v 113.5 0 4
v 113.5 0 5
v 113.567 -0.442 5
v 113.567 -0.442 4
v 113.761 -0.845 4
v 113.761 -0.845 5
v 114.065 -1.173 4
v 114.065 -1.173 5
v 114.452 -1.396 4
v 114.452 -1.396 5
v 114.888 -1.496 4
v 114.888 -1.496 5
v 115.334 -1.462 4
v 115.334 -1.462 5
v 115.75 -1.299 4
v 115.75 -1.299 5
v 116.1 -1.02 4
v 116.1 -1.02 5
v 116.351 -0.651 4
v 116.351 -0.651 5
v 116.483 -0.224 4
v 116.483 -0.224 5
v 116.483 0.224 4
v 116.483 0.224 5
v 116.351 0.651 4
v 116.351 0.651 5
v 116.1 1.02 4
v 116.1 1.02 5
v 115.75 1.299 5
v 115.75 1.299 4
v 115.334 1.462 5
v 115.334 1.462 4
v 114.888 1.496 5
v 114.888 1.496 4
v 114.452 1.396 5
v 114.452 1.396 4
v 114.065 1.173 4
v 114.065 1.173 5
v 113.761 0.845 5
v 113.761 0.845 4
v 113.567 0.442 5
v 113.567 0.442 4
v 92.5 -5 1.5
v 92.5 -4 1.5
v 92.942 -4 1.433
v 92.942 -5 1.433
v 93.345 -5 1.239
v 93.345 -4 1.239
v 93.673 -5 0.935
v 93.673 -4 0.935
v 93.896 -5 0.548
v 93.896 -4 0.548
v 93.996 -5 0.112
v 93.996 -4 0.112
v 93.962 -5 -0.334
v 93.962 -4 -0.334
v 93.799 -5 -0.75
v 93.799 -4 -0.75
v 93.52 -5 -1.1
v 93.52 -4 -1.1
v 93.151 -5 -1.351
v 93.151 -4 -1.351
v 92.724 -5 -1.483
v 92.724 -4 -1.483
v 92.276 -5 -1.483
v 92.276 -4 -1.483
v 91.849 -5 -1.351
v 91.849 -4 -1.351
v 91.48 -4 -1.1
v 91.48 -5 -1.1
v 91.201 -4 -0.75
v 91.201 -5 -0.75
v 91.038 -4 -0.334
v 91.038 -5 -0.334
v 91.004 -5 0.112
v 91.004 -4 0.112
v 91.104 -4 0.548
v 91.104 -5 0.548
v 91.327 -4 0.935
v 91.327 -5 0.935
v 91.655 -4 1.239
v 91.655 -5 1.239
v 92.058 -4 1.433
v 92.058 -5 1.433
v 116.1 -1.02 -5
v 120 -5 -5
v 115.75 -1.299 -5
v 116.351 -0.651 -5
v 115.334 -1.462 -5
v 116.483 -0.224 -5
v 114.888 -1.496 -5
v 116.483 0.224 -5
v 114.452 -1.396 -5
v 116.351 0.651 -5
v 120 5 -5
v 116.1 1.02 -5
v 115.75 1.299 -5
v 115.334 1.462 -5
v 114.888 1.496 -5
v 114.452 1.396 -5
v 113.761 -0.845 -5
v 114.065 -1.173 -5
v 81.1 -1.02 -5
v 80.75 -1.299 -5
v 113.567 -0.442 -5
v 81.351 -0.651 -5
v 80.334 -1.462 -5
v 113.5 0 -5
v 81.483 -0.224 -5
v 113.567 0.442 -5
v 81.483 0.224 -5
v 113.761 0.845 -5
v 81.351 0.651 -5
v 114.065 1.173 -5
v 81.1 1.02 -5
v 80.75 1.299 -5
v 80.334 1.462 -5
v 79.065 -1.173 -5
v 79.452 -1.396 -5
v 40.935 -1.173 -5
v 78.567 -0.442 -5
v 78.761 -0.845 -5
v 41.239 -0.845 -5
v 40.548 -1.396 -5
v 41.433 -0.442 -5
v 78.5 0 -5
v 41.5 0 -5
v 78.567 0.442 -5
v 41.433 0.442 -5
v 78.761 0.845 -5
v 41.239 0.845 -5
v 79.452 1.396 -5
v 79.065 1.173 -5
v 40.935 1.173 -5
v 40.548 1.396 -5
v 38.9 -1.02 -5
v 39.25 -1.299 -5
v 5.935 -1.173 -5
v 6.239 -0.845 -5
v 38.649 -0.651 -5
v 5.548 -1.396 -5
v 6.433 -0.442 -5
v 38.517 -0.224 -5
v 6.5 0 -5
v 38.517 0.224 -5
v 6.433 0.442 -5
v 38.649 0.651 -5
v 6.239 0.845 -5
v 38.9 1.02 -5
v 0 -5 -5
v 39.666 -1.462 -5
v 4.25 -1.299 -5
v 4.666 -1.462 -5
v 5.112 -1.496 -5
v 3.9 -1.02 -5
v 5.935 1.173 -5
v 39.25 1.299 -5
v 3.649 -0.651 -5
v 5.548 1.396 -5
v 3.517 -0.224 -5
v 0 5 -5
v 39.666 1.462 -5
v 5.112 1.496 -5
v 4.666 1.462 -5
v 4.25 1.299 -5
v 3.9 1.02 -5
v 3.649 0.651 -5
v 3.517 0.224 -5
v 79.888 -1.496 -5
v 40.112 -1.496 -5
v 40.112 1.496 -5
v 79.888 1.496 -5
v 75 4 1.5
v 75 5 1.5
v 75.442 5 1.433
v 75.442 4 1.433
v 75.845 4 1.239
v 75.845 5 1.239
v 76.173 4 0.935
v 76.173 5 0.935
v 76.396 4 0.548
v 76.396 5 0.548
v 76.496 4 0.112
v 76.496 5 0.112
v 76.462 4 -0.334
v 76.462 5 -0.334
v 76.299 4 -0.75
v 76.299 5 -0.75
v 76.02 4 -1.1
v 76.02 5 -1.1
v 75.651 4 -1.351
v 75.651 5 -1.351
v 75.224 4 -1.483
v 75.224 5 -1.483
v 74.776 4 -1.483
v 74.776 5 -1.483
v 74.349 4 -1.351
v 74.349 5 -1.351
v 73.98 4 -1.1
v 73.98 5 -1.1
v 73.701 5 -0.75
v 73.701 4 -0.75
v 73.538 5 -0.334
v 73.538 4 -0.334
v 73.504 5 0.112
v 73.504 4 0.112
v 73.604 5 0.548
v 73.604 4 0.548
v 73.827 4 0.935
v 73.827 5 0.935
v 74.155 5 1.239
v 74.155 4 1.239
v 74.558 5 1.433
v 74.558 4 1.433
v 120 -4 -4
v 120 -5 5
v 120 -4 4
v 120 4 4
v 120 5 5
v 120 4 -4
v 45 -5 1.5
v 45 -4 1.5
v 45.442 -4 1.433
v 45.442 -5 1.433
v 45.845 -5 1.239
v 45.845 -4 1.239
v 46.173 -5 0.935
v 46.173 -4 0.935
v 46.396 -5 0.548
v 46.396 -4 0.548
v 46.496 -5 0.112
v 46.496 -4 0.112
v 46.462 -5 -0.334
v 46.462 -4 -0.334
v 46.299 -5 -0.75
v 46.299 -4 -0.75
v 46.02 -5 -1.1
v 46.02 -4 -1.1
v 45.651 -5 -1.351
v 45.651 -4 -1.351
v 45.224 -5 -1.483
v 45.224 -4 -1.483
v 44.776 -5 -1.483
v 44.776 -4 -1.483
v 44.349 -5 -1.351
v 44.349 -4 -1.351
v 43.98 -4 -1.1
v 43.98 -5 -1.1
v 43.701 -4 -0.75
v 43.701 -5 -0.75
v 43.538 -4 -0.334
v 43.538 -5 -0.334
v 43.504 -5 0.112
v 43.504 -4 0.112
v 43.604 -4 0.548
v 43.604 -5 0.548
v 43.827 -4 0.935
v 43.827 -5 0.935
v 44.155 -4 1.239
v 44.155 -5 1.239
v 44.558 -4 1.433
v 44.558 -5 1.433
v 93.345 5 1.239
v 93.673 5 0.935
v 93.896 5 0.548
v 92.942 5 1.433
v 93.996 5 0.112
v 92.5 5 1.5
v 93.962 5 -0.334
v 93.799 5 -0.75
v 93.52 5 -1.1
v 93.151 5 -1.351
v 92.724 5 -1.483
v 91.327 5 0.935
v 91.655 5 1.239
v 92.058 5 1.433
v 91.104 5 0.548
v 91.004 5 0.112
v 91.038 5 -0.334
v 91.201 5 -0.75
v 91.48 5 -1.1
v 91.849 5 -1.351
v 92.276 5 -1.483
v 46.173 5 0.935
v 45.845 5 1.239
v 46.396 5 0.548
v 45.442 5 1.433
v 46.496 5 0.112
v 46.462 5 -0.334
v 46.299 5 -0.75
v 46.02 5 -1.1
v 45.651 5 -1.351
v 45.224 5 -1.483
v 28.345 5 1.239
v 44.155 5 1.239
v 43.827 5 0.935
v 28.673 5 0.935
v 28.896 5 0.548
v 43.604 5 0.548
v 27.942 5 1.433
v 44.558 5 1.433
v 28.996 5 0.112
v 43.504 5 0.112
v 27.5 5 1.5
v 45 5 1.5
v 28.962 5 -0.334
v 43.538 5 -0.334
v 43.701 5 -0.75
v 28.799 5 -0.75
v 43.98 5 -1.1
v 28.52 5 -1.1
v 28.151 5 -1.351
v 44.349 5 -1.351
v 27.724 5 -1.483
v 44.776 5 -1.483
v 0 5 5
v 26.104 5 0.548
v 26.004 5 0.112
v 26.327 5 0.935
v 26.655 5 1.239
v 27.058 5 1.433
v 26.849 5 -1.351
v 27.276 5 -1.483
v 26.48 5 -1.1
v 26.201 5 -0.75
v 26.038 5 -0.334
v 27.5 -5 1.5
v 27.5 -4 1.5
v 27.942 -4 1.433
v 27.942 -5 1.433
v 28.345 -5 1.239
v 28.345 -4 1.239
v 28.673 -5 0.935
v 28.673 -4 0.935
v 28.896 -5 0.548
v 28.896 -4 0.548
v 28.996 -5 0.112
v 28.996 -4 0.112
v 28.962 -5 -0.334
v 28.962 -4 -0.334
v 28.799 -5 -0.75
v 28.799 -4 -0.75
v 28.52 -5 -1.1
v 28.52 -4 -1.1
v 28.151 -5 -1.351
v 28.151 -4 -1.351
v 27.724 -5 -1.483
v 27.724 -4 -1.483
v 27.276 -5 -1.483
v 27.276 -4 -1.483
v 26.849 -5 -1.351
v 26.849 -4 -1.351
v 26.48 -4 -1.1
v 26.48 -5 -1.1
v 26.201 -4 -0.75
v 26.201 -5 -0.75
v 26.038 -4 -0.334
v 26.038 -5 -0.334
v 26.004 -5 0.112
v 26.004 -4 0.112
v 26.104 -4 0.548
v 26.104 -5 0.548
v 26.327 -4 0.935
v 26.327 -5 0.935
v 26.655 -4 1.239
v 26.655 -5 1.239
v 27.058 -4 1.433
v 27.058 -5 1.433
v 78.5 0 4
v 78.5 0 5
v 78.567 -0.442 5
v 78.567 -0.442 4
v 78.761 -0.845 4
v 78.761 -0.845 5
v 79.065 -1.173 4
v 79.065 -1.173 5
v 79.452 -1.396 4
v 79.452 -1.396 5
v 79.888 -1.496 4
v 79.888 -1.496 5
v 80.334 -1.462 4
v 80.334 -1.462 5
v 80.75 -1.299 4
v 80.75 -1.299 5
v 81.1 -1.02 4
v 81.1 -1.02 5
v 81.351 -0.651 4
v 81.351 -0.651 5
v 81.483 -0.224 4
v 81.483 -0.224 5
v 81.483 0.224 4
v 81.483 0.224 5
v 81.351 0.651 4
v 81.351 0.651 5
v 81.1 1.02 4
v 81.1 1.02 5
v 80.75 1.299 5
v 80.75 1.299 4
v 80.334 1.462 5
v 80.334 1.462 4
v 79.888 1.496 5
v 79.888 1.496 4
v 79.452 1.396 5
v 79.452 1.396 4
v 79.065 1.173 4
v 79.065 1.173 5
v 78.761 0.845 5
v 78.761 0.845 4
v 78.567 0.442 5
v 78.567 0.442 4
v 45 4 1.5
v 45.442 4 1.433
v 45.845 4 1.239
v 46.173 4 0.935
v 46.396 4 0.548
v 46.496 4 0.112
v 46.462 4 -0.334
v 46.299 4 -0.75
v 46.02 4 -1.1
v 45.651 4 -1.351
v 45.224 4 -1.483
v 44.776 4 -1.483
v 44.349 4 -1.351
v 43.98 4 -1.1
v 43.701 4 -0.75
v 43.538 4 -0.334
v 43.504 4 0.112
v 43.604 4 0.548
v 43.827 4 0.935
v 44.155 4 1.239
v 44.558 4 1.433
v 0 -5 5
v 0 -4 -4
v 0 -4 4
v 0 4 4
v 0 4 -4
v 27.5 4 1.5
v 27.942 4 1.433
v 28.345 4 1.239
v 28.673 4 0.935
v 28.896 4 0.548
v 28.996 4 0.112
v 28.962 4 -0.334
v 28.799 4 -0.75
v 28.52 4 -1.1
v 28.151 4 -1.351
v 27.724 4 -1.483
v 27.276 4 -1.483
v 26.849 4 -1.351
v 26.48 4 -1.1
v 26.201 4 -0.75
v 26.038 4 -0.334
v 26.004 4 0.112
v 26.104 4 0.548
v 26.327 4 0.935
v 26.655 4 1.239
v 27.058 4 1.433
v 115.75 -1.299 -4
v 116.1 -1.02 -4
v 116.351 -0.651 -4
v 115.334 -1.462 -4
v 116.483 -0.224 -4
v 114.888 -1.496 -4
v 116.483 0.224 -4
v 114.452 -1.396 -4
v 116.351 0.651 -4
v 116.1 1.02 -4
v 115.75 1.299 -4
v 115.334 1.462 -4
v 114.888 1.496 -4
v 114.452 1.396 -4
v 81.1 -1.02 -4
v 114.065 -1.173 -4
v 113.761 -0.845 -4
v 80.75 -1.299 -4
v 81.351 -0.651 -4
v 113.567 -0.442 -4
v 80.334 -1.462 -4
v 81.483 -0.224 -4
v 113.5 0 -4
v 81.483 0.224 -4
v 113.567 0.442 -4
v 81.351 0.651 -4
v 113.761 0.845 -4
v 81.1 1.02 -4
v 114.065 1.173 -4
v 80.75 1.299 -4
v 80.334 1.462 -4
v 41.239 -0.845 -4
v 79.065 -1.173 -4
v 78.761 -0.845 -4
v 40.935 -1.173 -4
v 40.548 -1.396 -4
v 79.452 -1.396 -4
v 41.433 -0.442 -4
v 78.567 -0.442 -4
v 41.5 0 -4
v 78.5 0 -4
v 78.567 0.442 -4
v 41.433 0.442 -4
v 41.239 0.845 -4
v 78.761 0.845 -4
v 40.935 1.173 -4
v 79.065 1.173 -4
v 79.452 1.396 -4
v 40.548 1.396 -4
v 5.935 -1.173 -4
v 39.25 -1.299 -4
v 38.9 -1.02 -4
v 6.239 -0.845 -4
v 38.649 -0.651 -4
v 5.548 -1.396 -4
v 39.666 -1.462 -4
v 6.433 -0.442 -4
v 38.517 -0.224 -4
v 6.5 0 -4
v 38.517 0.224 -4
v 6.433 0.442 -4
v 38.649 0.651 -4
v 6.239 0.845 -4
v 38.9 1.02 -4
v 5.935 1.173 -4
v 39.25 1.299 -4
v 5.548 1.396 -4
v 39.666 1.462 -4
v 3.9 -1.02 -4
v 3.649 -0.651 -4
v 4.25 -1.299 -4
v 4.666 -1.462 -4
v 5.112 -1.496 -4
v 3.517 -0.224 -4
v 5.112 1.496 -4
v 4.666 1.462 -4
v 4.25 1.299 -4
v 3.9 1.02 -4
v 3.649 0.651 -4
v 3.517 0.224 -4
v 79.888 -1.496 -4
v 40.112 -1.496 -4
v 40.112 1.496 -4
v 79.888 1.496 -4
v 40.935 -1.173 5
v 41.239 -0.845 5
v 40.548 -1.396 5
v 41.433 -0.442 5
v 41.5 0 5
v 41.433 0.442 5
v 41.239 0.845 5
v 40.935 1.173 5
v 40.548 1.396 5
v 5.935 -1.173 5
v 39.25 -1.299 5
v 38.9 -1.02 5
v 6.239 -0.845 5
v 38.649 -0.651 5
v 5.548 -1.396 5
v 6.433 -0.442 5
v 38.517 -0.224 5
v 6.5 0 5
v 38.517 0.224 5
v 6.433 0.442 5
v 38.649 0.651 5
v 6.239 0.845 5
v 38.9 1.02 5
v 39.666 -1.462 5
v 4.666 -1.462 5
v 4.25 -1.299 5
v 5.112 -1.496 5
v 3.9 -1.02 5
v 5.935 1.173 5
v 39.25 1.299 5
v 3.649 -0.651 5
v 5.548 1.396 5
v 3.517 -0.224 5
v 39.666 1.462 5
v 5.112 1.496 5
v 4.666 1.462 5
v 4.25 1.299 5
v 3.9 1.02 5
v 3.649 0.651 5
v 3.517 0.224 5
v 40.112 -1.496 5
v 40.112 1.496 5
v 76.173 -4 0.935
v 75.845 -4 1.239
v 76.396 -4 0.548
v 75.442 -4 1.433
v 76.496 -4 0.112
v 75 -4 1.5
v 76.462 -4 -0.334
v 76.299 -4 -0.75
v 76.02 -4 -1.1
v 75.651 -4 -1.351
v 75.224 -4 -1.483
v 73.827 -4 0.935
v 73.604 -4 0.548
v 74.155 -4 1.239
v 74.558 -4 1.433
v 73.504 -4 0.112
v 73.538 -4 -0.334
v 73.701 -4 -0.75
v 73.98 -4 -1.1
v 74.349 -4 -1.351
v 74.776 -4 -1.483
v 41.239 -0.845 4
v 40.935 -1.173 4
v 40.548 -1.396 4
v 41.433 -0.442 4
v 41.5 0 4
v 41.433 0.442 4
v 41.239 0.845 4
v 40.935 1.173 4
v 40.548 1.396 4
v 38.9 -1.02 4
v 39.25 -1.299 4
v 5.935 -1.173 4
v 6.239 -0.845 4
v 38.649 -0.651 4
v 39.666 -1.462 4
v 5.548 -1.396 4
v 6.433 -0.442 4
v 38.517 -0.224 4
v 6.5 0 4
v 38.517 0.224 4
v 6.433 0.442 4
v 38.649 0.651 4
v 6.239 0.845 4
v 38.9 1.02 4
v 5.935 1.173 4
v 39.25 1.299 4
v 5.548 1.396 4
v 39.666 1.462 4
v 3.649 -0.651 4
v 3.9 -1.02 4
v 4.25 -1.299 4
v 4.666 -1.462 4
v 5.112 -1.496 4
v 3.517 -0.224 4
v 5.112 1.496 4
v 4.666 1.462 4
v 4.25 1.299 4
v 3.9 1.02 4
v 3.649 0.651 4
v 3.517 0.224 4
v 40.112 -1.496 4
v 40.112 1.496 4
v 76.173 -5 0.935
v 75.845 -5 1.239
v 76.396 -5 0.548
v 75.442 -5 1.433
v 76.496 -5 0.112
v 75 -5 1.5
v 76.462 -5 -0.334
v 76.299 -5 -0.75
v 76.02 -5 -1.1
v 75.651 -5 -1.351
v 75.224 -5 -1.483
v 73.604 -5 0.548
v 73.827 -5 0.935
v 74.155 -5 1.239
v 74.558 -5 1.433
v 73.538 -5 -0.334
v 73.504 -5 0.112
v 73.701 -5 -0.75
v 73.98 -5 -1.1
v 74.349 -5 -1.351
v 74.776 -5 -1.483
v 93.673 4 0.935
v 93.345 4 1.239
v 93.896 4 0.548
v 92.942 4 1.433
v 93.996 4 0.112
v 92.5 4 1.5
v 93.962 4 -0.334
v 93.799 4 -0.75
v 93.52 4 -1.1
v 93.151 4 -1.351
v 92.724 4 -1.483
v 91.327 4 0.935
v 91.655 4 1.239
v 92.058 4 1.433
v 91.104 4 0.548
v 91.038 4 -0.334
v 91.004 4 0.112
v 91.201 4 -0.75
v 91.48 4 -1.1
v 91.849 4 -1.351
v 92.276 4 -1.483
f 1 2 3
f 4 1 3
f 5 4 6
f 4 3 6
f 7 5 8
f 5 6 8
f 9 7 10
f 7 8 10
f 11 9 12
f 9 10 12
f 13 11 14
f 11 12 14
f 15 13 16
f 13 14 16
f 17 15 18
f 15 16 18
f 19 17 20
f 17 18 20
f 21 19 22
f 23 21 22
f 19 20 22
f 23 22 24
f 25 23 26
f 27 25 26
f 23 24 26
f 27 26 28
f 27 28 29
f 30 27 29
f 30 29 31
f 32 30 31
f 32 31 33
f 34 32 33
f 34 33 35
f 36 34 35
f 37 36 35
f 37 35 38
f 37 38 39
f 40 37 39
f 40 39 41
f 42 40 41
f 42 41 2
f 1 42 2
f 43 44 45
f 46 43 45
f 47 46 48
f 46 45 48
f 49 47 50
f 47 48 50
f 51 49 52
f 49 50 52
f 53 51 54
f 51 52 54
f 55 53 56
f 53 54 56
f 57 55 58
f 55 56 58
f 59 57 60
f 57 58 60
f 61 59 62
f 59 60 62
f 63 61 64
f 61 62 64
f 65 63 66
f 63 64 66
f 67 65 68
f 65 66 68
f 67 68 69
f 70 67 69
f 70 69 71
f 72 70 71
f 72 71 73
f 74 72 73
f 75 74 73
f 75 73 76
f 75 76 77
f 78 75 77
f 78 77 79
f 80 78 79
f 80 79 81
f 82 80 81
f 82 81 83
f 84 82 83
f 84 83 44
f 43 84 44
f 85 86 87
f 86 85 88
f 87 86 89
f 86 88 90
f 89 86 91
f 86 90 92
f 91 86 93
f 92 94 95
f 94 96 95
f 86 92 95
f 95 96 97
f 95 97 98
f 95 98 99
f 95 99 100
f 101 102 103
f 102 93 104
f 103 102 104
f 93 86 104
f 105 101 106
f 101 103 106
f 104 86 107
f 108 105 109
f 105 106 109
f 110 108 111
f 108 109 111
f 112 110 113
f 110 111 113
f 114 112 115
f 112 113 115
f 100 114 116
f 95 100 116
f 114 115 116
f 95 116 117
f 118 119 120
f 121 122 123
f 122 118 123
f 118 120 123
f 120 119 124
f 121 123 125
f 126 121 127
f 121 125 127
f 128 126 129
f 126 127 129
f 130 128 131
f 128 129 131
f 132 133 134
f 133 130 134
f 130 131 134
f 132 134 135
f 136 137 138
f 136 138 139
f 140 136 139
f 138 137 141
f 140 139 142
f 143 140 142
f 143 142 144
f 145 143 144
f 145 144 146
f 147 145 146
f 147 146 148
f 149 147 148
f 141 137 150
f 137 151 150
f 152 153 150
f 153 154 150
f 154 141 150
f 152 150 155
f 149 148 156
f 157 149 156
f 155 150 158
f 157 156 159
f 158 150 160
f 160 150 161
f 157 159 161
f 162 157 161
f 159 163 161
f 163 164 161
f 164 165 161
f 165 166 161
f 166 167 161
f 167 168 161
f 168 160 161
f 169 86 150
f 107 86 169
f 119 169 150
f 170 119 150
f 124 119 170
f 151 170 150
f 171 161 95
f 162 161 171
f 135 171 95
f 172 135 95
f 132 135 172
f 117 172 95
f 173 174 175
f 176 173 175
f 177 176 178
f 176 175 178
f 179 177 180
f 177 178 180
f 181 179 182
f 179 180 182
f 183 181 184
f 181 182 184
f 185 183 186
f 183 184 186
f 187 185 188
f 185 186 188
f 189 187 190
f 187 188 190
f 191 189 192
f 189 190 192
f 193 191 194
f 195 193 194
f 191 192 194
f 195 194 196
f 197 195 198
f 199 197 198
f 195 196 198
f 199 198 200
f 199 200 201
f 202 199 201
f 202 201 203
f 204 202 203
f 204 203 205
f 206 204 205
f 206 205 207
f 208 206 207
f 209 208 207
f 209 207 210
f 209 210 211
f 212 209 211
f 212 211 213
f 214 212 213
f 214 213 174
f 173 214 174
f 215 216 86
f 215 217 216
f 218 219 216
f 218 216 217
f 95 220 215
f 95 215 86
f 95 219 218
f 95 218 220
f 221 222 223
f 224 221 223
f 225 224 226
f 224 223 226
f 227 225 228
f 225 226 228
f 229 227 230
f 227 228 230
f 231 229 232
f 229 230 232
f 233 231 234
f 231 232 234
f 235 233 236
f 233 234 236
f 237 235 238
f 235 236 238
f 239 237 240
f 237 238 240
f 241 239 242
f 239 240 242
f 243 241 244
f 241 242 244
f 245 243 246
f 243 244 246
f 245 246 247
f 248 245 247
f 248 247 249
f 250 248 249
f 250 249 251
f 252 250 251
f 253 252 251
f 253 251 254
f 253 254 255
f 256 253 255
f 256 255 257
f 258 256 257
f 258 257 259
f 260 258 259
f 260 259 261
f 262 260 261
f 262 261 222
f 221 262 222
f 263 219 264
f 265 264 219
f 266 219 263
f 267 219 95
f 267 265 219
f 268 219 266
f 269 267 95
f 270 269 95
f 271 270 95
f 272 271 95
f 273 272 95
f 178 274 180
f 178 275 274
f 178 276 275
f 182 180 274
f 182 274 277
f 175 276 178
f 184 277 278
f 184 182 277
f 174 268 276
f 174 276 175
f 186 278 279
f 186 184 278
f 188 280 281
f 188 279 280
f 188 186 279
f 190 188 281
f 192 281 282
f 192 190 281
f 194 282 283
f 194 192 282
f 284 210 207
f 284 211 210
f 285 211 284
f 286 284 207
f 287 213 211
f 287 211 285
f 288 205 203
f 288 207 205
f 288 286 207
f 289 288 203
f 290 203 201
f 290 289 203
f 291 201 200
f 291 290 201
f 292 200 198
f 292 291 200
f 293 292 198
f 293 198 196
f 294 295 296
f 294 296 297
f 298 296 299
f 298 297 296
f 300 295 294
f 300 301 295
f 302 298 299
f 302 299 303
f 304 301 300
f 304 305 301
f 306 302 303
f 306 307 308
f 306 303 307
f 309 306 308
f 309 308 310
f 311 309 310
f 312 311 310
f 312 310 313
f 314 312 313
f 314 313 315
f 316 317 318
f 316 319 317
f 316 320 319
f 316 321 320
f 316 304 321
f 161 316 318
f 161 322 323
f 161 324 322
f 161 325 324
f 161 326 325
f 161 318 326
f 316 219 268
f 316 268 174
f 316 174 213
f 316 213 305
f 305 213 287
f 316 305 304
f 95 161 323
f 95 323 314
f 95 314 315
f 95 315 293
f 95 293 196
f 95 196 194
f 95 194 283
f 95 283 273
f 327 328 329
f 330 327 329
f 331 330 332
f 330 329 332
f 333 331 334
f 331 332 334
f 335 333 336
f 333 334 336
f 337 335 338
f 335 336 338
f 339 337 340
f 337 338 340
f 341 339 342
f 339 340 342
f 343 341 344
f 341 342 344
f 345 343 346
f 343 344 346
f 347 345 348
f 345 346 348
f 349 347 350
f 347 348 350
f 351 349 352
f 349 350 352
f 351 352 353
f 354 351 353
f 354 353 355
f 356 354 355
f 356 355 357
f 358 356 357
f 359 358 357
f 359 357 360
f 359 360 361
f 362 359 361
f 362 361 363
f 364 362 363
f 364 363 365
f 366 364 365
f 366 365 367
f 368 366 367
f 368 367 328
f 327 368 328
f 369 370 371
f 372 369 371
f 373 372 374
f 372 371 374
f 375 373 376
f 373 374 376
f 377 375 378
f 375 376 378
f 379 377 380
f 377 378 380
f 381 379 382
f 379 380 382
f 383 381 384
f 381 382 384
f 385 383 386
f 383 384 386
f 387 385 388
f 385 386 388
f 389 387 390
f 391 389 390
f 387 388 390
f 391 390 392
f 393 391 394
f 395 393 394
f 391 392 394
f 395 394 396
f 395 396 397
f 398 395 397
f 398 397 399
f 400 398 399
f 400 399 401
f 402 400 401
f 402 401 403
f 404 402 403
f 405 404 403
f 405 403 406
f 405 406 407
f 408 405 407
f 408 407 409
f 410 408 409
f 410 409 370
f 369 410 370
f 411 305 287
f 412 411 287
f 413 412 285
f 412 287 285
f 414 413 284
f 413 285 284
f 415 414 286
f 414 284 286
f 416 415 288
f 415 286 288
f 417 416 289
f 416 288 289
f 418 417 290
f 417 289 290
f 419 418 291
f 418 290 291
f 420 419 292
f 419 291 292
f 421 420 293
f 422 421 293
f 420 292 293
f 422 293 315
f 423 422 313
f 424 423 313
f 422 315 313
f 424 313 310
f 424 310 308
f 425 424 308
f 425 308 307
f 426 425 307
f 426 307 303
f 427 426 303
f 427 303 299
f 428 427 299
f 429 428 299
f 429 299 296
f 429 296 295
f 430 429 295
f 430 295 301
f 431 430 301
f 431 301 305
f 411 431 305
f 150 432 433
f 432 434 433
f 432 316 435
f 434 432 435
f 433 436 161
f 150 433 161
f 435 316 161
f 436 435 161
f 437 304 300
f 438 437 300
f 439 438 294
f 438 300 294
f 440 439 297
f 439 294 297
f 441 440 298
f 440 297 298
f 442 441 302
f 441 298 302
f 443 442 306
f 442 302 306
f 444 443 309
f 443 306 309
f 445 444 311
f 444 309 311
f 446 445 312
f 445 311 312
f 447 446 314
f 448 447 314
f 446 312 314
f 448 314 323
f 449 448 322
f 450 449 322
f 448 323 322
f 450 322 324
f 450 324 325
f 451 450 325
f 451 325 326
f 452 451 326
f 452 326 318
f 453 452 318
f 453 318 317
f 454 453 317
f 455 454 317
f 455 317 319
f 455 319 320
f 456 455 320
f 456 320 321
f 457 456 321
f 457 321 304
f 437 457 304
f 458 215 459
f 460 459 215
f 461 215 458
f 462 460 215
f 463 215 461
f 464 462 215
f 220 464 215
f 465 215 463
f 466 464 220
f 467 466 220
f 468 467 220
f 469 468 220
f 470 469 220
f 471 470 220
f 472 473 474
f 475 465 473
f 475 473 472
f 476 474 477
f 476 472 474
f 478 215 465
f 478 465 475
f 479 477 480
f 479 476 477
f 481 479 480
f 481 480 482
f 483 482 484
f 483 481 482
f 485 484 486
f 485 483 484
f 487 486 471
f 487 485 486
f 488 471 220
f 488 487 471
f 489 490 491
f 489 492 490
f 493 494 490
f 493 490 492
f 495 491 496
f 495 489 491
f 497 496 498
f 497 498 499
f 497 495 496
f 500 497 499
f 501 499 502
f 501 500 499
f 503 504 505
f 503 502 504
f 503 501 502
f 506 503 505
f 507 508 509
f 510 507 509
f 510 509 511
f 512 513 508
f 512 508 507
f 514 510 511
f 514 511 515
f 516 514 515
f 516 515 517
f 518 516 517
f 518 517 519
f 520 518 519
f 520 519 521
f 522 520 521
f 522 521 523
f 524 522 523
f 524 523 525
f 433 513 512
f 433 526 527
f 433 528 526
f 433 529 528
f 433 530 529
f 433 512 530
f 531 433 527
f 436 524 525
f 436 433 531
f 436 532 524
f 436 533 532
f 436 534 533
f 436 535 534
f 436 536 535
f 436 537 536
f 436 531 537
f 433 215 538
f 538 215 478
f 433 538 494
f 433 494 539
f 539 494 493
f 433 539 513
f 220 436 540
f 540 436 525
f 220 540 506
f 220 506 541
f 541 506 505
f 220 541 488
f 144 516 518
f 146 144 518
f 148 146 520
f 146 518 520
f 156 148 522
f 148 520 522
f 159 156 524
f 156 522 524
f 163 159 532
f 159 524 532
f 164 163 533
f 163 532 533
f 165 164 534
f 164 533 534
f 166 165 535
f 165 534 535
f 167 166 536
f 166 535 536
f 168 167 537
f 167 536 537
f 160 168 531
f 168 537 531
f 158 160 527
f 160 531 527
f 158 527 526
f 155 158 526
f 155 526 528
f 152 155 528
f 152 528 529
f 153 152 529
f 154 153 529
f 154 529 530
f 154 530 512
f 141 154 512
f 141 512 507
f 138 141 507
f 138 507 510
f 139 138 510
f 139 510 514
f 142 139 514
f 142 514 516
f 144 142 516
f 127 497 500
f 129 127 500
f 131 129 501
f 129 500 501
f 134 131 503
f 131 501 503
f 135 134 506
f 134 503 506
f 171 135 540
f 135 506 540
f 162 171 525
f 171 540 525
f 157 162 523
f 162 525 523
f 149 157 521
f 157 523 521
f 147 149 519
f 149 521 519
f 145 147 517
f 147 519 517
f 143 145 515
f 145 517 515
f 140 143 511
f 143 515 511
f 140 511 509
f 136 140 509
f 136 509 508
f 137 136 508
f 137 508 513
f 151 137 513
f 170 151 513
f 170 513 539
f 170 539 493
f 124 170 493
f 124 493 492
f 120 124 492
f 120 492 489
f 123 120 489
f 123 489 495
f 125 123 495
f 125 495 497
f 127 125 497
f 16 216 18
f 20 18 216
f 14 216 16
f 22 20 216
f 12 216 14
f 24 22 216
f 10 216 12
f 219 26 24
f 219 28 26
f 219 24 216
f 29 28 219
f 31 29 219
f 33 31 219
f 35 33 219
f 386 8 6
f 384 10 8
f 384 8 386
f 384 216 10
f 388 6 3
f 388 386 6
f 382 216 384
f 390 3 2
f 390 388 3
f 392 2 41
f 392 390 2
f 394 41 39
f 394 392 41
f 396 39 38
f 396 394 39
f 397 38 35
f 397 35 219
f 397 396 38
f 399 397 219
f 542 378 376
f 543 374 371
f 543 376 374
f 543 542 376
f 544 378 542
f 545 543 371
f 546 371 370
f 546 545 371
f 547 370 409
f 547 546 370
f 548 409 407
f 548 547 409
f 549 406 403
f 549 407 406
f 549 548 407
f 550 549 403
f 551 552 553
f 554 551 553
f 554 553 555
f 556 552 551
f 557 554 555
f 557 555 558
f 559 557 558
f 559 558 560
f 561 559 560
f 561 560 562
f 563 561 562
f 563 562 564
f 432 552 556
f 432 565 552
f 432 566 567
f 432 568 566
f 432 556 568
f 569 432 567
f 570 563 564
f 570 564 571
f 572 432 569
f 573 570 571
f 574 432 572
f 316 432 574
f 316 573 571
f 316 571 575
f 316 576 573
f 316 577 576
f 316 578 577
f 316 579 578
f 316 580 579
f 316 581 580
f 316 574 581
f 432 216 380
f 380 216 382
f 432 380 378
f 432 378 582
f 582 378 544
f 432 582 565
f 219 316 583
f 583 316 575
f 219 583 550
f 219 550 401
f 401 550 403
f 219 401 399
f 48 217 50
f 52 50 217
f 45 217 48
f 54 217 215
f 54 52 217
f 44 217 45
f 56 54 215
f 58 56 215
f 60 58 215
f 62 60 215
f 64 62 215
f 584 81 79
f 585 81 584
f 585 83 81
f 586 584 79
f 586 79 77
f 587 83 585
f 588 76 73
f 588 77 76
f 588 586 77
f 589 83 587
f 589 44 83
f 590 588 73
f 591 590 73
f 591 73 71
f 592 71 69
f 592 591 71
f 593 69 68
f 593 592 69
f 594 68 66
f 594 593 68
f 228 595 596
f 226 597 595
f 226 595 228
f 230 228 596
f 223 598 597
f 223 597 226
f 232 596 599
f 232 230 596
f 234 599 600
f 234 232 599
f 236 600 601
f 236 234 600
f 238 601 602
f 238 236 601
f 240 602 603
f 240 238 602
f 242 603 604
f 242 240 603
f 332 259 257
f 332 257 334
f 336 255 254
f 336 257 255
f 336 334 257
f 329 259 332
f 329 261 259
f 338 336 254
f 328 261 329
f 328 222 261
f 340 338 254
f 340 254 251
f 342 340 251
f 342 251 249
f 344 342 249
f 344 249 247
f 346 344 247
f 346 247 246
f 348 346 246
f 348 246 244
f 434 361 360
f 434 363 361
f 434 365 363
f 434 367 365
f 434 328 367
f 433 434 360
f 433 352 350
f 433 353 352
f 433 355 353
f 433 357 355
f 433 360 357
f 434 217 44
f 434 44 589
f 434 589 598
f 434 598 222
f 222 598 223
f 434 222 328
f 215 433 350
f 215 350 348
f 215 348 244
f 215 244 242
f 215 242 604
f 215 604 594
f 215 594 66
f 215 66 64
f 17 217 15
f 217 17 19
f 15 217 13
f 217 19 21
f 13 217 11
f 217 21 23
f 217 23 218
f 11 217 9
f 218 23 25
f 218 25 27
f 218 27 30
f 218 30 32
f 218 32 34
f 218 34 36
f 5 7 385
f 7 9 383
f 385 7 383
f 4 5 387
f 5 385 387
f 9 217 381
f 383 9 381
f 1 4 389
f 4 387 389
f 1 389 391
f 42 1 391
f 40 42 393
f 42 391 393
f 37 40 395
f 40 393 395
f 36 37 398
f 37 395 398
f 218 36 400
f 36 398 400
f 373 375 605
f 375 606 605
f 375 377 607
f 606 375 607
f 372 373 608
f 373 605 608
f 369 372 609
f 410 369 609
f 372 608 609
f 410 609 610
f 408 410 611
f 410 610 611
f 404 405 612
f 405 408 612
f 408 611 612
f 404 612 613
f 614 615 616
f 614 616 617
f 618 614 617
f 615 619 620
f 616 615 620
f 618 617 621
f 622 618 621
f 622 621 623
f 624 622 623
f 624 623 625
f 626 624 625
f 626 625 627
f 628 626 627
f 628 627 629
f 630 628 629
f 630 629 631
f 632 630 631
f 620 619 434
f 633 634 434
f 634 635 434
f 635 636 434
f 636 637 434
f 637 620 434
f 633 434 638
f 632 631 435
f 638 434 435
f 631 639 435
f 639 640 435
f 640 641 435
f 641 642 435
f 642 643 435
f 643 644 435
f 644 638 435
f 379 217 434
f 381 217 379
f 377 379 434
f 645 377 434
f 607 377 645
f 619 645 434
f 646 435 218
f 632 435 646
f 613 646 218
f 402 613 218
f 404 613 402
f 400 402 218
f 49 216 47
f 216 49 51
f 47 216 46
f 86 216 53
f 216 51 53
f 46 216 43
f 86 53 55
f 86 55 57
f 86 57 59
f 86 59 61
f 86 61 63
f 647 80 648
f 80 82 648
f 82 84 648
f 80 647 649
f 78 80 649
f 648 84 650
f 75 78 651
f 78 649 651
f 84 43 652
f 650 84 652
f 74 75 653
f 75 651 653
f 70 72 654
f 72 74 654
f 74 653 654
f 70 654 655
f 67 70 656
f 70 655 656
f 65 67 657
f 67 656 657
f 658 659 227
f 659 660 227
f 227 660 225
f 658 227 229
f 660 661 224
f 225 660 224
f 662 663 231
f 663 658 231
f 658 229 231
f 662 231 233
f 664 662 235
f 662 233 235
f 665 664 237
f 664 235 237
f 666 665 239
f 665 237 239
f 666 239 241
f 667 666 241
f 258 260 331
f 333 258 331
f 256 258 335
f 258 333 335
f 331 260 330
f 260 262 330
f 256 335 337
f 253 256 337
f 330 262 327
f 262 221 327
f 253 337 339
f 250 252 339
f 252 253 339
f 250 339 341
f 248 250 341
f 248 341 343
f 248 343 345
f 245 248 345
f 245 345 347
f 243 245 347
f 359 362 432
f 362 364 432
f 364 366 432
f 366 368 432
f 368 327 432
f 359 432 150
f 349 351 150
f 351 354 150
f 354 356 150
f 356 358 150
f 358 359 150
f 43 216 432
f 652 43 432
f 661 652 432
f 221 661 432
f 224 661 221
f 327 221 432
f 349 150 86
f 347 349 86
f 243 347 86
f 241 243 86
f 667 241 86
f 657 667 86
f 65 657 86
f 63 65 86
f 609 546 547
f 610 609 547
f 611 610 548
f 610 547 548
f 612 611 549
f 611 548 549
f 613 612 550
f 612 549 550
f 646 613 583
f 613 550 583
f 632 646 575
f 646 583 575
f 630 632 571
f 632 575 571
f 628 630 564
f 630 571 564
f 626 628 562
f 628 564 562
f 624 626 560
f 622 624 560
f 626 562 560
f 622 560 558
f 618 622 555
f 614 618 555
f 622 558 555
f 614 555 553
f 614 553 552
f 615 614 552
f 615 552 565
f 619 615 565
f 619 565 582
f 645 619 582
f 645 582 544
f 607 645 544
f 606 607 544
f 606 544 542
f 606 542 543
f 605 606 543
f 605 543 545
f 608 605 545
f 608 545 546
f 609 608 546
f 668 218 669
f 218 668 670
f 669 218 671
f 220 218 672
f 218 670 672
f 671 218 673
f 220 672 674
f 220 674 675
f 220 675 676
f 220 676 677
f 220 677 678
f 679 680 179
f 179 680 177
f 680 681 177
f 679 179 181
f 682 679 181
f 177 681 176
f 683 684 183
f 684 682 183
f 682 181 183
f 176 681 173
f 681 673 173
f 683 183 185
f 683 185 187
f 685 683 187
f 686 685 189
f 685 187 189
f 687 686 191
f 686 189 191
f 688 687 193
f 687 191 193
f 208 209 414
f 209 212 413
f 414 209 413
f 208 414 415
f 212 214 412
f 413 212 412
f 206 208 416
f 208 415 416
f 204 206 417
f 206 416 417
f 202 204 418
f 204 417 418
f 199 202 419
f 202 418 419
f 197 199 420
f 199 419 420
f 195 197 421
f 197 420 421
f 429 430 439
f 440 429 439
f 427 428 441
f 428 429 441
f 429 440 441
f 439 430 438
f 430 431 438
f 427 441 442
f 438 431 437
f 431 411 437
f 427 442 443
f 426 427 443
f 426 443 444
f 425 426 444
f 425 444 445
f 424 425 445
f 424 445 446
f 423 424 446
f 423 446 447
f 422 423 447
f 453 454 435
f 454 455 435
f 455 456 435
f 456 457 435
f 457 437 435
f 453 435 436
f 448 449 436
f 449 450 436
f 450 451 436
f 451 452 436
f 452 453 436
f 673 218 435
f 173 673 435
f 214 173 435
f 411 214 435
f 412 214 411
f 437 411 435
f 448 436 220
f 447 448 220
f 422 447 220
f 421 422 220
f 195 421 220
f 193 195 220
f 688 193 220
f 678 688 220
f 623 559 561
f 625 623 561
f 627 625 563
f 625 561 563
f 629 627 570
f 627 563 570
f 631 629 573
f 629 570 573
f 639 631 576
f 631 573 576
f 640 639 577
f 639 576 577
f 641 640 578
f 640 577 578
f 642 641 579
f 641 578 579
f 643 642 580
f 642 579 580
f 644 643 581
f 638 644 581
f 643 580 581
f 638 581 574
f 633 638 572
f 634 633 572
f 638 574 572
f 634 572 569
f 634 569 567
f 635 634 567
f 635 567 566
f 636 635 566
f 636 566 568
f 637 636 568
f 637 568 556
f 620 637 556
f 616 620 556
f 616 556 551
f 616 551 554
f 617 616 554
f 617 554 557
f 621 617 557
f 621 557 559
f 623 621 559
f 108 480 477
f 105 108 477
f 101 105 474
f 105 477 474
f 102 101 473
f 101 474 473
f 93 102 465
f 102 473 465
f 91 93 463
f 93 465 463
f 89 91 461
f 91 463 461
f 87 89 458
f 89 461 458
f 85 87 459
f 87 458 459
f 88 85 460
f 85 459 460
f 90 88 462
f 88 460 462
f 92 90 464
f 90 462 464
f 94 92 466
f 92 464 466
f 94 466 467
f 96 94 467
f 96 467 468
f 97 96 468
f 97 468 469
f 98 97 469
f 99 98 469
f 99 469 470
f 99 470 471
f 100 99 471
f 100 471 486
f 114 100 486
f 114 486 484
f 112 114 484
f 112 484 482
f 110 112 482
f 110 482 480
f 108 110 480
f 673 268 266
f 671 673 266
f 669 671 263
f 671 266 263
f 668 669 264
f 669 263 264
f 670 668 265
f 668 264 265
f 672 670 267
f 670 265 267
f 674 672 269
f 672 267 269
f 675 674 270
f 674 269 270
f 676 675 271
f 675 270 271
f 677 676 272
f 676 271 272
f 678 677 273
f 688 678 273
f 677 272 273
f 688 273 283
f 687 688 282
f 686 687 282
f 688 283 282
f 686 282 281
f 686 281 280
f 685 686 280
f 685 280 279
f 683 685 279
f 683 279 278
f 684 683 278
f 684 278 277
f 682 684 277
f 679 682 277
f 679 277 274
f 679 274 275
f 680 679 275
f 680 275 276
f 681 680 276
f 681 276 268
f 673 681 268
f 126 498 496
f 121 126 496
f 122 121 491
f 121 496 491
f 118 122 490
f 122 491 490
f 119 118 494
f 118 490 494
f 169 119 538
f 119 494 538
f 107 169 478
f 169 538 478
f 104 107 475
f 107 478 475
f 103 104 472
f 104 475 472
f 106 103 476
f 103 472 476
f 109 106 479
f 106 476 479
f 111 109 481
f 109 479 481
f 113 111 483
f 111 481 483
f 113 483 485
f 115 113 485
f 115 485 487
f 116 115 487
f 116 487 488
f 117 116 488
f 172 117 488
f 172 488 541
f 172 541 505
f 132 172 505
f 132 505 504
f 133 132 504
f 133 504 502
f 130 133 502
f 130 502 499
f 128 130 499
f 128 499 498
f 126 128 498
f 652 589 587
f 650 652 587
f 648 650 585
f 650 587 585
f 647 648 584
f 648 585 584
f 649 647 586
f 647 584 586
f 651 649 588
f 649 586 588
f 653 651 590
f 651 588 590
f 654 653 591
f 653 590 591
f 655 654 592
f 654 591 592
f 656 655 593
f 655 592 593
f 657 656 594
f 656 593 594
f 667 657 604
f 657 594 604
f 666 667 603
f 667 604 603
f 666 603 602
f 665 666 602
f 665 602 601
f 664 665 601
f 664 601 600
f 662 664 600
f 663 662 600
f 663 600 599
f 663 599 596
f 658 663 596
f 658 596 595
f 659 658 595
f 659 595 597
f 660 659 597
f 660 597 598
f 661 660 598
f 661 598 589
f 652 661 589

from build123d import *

# Parameters (mm, degrees)
SKETCH_1_W          = 10
SKETCH_1_H          = 10
SKETCH_1_W_2        = 8
SKETCH_1_H_2        = 8
EXTRUDE_1_DEPTH     = 120
SKETCH_2_R          = 1.5
CUT_EXTRUDE_1_DEPTH = 121.519707932
SKETCH_3_R          = 1.5
CUT_EXTRUDE_2_DEPTH = 121.519707932


with BuildPart() as part:
    # ｽｹｯﾁ1 → 押し出し-薄板1 (new body)
    with BuildSketch(Plane(origin=(0, 0, 0), x_dir=(0, 0, -1), z_dir=(1, 0, 0))):
        Rectangle(SKETCH_1_W, SKETCH_1_H)
        Rectangle(SKETCH_1_W_2, SKETCH_1_H_2, mode=Mode.SUBTRACT)
    extrude(amount=EXTRUDE_1_DEPTH)

    # ｽｹｯﾁ2 → ｶｯﾄ - 押し出し1 (cut, through all)
    with BuildSketch(Plane.XY.offset(5)):
        with Locations((5, 0)):
            Circle(SKETCH_2_R)
        with Locations(Location((115, 0, 0), (0, 0, 180))):
            Circle(SKETCH_2_R)
        with Locations((40, 0)):
            Circle(SKETCH_2_R)
        with Locations(Location((80, 0, 0), (0, 0, 180))):
            Circle(SKETCH_2_R)
    extrude(amount=-CUT_EXTRUDE_1_DEPTH, mode=Mode.SUBTRACT)

    # ｽｹｯﾁ3 → ｶｯﾄ - 押し出し2 (cut, through all)
    with BuildSketch(Plane(origin=(0, 5, 0), x_dir=(1, 0, 0), z_dir=(0, 1, 0))):
        with Locations(Location((45, 0, 0), (0, 0, 270))):
            Circle(SKETCH_3_R)
        with Locations(Location((75, 0, 0), (0, 0, 270))):
            Circle(SKETCH_3_R)
        with Locations(Location((27.5, 0, 0), (0, 0, 270))):
            Circle(SKETCH_3_R)
        with Locations(Location((92.5, 0, 0), (0, 0, 270))):
            Circle(SKETCH_3_R)
    extrude(amount=-CUT_EXTRUDE_2_DEPTH, mode=Mode.SUBTRACT)


solid = part.part
